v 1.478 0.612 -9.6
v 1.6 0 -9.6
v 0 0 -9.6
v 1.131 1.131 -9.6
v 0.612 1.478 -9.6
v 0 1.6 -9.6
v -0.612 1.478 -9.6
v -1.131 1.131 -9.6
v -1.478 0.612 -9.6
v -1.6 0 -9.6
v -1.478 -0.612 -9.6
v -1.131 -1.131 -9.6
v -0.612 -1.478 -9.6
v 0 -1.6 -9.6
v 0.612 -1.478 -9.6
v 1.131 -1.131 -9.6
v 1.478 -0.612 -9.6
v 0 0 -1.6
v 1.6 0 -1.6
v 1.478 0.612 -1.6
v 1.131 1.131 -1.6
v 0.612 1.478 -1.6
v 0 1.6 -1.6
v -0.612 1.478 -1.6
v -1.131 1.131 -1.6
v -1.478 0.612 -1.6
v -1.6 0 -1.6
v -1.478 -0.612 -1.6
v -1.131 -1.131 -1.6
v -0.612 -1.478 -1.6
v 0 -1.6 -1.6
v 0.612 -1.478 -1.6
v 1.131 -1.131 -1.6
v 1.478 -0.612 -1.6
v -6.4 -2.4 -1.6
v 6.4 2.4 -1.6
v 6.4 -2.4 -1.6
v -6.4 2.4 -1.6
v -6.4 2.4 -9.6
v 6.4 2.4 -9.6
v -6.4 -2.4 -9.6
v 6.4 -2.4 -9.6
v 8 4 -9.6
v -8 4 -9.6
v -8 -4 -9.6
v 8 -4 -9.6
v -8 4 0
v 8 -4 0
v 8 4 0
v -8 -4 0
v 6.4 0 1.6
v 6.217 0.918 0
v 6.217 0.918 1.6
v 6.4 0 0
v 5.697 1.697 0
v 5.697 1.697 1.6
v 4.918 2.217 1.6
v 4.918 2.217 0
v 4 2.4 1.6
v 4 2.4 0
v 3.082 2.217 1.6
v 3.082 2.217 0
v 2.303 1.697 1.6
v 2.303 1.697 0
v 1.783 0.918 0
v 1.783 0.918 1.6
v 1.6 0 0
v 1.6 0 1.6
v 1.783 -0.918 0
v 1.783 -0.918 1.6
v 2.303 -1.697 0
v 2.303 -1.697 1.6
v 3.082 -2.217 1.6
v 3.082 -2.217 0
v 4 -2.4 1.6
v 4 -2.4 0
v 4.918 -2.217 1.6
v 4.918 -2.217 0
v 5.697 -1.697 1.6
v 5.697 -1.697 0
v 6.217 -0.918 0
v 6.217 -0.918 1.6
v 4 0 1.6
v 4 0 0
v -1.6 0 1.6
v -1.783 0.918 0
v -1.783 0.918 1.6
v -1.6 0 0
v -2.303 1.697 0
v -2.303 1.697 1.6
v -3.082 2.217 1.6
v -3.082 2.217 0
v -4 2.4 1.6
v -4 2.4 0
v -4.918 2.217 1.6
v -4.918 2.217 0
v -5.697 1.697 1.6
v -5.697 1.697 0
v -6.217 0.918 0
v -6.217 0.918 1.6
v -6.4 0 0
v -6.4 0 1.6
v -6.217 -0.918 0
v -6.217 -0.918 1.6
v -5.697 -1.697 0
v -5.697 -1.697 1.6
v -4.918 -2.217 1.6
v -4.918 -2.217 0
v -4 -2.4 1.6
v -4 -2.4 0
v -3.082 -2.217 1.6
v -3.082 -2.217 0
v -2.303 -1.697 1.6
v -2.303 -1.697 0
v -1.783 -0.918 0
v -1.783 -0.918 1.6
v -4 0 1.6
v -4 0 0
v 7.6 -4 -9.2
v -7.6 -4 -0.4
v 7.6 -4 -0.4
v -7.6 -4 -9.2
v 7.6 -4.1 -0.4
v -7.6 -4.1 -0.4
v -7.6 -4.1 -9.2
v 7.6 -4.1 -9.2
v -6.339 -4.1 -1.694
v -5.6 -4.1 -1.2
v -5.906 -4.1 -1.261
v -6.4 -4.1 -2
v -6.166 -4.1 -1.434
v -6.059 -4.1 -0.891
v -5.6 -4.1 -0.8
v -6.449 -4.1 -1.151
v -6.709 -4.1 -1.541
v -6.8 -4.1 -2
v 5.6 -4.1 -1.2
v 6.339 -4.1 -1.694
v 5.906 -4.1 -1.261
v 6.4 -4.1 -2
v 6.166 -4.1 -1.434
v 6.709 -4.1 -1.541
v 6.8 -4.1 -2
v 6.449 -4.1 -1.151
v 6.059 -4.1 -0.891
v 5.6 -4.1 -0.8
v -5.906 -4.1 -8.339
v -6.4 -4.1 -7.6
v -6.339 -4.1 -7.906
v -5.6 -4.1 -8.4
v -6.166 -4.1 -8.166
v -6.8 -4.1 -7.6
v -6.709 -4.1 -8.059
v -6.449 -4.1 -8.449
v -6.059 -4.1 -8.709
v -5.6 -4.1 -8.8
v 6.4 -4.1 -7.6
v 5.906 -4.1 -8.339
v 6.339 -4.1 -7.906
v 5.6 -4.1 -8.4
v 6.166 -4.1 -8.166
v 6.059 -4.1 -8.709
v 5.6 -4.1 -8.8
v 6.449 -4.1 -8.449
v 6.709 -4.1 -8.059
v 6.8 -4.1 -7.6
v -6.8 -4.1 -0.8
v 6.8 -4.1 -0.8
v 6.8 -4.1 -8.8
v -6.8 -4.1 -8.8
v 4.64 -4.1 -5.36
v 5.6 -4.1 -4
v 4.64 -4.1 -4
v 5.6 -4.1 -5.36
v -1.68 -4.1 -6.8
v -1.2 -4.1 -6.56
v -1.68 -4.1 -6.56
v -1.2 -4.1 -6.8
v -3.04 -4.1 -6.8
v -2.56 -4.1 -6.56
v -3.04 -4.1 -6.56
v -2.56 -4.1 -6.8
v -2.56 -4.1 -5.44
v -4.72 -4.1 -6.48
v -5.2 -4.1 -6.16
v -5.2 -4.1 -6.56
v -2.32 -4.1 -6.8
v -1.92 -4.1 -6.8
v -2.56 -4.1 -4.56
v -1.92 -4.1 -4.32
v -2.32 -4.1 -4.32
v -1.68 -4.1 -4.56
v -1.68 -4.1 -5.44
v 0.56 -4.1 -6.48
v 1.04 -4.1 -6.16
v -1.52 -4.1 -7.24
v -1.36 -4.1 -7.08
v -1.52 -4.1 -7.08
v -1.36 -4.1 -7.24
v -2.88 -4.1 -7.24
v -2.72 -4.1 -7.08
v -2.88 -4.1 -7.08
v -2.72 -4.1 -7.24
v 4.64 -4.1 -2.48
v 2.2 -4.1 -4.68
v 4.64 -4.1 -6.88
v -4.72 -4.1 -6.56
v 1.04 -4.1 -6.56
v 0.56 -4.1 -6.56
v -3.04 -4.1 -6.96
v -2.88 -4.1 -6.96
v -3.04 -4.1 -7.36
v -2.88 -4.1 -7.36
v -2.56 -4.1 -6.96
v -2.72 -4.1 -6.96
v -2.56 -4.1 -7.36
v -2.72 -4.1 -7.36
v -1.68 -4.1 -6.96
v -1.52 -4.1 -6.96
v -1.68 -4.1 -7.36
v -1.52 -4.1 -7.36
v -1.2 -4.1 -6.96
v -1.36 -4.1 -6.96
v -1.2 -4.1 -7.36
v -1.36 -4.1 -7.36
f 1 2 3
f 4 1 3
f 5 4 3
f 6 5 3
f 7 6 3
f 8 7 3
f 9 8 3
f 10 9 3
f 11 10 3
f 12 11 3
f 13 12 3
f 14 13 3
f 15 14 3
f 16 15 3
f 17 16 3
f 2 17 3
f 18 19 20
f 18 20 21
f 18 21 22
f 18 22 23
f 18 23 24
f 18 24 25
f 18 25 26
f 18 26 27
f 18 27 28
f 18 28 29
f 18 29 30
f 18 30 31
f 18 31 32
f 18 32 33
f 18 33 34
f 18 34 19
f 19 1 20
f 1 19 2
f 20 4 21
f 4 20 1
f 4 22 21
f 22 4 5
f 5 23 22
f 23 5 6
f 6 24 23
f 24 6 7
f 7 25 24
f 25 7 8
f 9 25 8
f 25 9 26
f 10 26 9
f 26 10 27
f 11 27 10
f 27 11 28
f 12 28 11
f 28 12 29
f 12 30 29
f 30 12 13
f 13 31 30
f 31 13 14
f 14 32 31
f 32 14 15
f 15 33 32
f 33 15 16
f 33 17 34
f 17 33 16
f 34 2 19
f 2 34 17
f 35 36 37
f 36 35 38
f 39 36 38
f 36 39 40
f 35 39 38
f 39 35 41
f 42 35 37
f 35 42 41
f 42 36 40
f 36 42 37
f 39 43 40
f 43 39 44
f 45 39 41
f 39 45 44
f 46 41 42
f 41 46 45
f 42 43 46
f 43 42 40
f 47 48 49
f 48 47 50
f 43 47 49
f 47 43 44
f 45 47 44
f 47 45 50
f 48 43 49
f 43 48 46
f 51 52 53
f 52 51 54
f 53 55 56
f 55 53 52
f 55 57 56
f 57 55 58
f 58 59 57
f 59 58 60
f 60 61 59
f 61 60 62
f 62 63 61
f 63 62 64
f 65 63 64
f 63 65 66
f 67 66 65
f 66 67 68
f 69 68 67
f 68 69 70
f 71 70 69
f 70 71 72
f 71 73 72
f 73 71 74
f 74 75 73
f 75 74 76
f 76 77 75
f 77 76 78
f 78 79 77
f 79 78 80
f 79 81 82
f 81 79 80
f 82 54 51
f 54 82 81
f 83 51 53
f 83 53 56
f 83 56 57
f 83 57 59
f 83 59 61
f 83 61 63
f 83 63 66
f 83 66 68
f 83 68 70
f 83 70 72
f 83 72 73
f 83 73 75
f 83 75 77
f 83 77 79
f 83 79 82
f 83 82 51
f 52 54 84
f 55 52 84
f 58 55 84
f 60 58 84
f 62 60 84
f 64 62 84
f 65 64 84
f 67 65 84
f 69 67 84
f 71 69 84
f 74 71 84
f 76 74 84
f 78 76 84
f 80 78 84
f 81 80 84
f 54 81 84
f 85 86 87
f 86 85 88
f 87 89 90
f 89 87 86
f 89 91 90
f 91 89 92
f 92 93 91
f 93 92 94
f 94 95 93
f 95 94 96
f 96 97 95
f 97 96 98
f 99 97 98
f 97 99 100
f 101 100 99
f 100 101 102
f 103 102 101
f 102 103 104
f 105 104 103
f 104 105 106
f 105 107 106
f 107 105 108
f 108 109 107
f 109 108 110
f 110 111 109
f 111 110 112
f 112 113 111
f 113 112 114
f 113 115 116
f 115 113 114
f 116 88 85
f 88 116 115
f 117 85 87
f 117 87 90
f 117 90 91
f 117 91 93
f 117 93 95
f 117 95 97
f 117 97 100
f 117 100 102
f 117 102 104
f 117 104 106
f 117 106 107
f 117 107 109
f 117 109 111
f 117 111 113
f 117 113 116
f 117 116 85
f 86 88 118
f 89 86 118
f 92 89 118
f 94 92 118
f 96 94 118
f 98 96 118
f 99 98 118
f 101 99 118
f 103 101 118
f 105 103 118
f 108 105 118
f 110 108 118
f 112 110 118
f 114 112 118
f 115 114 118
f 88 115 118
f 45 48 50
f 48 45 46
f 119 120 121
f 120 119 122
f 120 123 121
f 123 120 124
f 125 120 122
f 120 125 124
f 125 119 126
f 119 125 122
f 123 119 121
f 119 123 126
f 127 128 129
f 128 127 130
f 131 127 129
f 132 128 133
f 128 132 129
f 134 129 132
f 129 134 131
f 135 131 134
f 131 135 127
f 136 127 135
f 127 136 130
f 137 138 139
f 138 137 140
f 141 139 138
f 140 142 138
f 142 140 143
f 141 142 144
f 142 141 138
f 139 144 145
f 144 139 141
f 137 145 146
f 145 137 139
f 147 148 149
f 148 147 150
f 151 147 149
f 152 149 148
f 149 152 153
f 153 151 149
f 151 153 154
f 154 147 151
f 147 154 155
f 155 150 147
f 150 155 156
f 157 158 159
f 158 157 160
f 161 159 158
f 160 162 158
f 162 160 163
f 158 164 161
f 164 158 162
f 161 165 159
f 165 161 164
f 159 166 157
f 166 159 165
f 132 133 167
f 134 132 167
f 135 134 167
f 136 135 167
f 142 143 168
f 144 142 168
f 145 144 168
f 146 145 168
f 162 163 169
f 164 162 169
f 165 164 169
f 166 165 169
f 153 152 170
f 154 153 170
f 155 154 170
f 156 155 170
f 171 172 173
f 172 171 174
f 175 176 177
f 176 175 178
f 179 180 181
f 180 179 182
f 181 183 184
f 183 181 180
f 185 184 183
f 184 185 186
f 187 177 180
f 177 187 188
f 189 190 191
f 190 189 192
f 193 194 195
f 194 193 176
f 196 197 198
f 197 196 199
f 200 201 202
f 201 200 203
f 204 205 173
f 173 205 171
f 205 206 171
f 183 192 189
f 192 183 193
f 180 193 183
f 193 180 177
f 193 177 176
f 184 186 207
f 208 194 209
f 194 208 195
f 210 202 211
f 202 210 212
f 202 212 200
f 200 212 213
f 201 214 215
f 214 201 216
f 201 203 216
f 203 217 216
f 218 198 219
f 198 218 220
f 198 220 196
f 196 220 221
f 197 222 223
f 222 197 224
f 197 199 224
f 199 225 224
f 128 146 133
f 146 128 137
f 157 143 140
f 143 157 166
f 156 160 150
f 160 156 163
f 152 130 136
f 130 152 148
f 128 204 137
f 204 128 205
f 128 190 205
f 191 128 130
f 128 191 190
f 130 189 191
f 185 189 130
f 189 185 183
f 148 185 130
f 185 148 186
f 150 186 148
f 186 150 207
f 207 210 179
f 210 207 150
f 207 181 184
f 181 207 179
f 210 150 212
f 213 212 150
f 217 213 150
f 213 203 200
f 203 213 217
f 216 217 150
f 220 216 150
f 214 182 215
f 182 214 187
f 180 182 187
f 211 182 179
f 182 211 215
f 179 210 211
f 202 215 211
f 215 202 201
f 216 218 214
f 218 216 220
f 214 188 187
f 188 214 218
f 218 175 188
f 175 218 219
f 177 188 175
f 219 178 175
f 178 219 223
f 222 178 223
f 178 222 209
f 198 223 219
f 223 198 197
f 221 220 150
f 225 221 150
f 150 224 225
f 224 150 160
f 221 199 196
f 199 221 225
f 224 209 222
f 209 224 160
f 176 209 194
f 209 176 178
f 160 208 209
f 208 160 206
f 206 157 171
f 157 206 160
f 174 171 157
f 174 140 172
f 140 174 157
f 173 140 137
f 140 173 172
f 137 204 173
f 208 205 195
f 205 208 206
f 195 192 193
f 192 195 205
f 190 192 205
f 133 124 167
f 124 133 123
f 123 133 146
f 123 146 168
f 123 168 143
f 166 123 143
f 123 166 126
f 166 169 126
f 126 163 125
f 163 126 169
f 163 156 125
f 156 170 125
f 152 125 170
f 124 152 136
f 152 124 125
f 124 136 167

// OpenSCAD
// file: ../p/4-4edge.scad
use <../lib.scad>
function ldraw_lib__4_4edge() = [
// 0 Circle 1.0
// 0 Name: 4-4edge.dat
// 0 Author: James Jessiman
// 0 !LDRAW_ORG Primitive UPDATE 2017-01
// 0 !LICENSE Licensed under CC BY 2.0 and CC BY 4.0 : see CAreadme.txt
// 
// 0 BFC CERTIFY CCW
  [0,"BFC","CERTIFY"],
  [0,"BFC","CCW"],
// 
// 0 !HISTORY 1998-12-15 [PTadmin] Official Update 1998-10
// 0 !HISTORY 2005-12-28 [PTadmin] Official Update 2005-01
// 0 !HISTORY 2007-06-24 [PTadmin] Header formatted for Contributor Agreement
// 0 !HISTORY 2008-07-01 [PTadmin] Official Update 2008-01
// 0 !HISTORY 2017-01-15 [Steffen] BFCed
// 0 !HISTORY 2017-12-30 [PTadmin] Official Update 2017-01
// 
// 
// 2 24 1 0 0 0.9239 0 0.3827
  [2,24,1,0,0,0.9239,0,0.3827],
// 2 24 0.9239 0 0.3827 0.7071 0 0.7071
  [2,24,0.9239,0,0.3827,0.7071,0,0.7071],
// 2 24 0.7071 0 0.7071 0.3827 0 0.9239
  [2,24,0.7071,0,0.7071,0.3827,0,0.9239],
// 2 24 0.3827 0 0.9239 0 0 1
  [2,24,0.3827,0,0.9239,0,0,1],
// 2 24 0 0 1 -0.3827 0 0.9239
  [2,24,0,0,1,-0.3827,0,0.9239],
// 2 24 -0.3827 0 0.9239 -0.7071 0 0.7071
  [2,24,-0.3827,0,0.9239,-0.7071,0,0.7071],
// 2 24 -0.7071 0 0.7071 -0.9239 0 0.3827
  [2,24,-0.7071,0,0.7071,-0.9239,0,0.3827],
// 2 24 -0.9239 0 0.3827 -1 0 -0
  [2,24,-0.9239,0,0.3827,-1,0,-0],
// 2 24 -1 0 -0 -0.9239 0 -0.3827
  [2,24,-1,0,-0,-0.9239,0,-0.3827],
// 2 24 -0.9239 0 -0.3827 -0.7071 0 -0.7071
  [2,24,-0.9239,0,-0.3827,-0.7071,0,-0.7071],
// 2 24 -0.7071 0 -0.7071 -0.3827 0 -0.9239
  [2,24,-0.7071,0,-0.7071,-0.3827,0,-0.9239],
// 2 24 -0.3827 0 -0.9239 0 0 -1
  [2,24,-0.3827,0,-0.9239,0,0,-1],
// 2 24 0 0 -1 0.3827 0 -0.9239
  [2,24,0,0,-1,0.3827,0,-0.9239],
// 2 24 0.3827 0 -0.9239 0.7071 0 -0.7071
  [2,24,0.3827,0,-0.9239,0.7071,0,-0.7071],
// 2 24 0.7071 0 -0.7071 0.9239 0 -0.3827
  [2,24,0.7071,0,-0.7071,0.9239,0,-0.3827],
// 2 24 0.9239 0 -0.3827 1 0 0
  [2,24,0.9239,0,-0.3827,1,0,0],
];
module ldraw_lib__4_4edge(step=0, col=false, unit=2/5, alt=false, line=0.2, solid=!$preview)
    makepoly(ldraw_lib__4_4edge(), step=step, col=col, unit=unit, alt=alt, line=line, solid=solid);
ldraw_lib__4_4edge(line=0.2);
// file: ../p/4-4disc.scad
use <../lib.scad>
function ldraw_lib__4_4disc() = [
// 0 Disc 1.0
// 0 Name: 4-4disc.dat
// 0 Author: James Jessiman
// 0 !LDRAW_ORG Primitive UPDATE 2002-02
// 0 !LICENSE Licensed under CC BY 2.0 and CC BY 4.0 : see CAreadme.txt
// 
// 0 BFC CERTIFY CCW
  [0,"BFC","CERTIFY"],
  [0,"BFC","CCW"],
// 
// 0 !HISTORY 1998-12-15 [PTadmin] Official Update 1998-10
// 0 !HISTORY 2002-03-23 [sbliss] Added BFC statement
// 0 !HISTORY 2002-04-25 [PTadmin] Official Update 2002-02
// 0 !HISTORY 2007-06-24 [PTadmin] Header formatted for Contributor Agreement
// 0 !HISTORY 2008-07-01 [PTadmin] Official Update 2008-01
// 
// 
// 3 16 0 0 0 1 0 0 0.9239 0 0.3827
  [3,16,0,0,0,1,0,0,0.9239,0,0.3827],
// 3 16 0 0 0 0.9239 0 0.3827 0.7071 0 0.7071
  [3,16,0,0,0,0.9239,0,0.3827,0.7071,0,0.7071],
// 3 16 0 0 0 0.7071 0 0.7071 0.3827 0 0.9239
  [3,16,0,0,0,0.7071,0,0.7071,0.3827,0,0.9239],
// 3 16 0 0 0 0.3827 0 0.9239 0 0 1
  [3,16,0,0,0,0.3827,0,0.9239,0,0,1],
// 3 16 0 0 0 0 0 1 -0.3827 0 0.9239
  [3,16,0,0,0,0,0,1,-0.3827,0,0.9239],
// 3 16 0 0 0 -0.3827 0 0.9239 -0.7071 0 0.7071
  [3,16,0,0,0,-0.3827,0,0.9239,-0.7071,0,0.7071],
// 3 16 0 0 0 -0.7071 0 0.7071 -0.9239 0 0.3827
  [3,16,0,0,0,-0.7071,0,0.7071,-0.9239,0,0.3827],
// 3 16 0 0 0 -0.9239 0 0.3827 -1 0 -0
  [3,16,0,0,0,-0.9239,0,0.3827,-1,0,-0],
// 3 16 0 0 0 -1 0 -0 -0.9239 0 -0.3827
  [3,16,0,0,0,-1,0,-0,-0.9239,0,-0.3827],
// 3 16 0 0 0 -0.9239 0 -0.3827 -0.7071 0 -0.7071
  [3,16,0,0,0,-0.9239,0,-0.3827,-0.7071,0,-0.7071],
// 3 16 0 0 0 -0.7071 0 -0.7071 -0.3827 0 -0.9239
  [3,16,0,0,0,-0.7071,0,-0.7071,-0.3827,0,-0.9239],
// 3 16 0 0 0 -0.3827 0 -0.9239 0 0 -1
  [3,16,0,0,0,-0.3827,0,-0.9239,0,0,-1],
// 3 16 0 0 0 0 0 -1 0.3827 0 -0.9239
  [3,16,0,0,0,0,0,-1,0.3827,0,-0.9239],
// 3 16 0 0 0 0.3827 0 -0.9239 0.7071 0 -0.7071
  [3,16,0,0,0,0.3827,0,-0.9239,0.7071,0,-0.7071],
// 3 16 0 0 0 0.7071 0 -0.7071 0.9239 0 -0.3827
  [3,16,0,0,0,0.7071,0,-0.7071,0.9239,0,-0.3827],
// 3 16 0 0 0 0.9239 0 -0.3827 1 0 0
  [3,16,0,0,0,0.9239,0,-0.3827,1,0,0],
// 0
];
module ldraw_lib__4_4disc(step=0, col=false, unit=2/5, alt=false, line=0.2, solid=!$preview)
    makepoly(ldraw_lib__4_4disc(), step=step, col=col, unit=unit, alt=alt, line=line, solid=solid);
ldraw_lib__4_4disc(line=0.2);
// file: ../p/4-4cyli.scad
use <../lib.scad>
$fa=1; $fs=0.2;
function ldraw_lib__4_4cyli(realsolid=false) = [
// 0 Cylinder 1.0
// 0 Name: 4-4cyli.dat
// 0 Author: James Jessiman
// 0 !LDRAW_ORG Primitive UPDATE 2005-01
// 0 !LICENSE Licensed under CC BY 2.0 and CC BY 4.0 : see CAreadme.txt
// 
// 0 BFC CERTIFY CCW
  [0,"BFC","CERTIFY"],
  [0,"BFC","CCW"],
// 
// 0 !HISTORY 1998-12-15 [PTadmin] Official Update 1998-10
// 0 !HISTORY 2002-03-23 [sbliss] Added BFC statement; merged headers from files in distributions LDraw 0.27 and Complete.
// 0 !HISTORY 2002-04-25 [PTadmin] Official Update 2002-02
// 0 !HISTORY 2004-12-14 [guyvivan] BFC CCW
// 0 !HISTORY 2005-12-28 [PTadmin] Official Update 2005-01
// 0 !HISTORY 2007-06-24 [PTadmin] Header formatted for Contributor Agreement
// 0 !HISTORY 2008-07-01 [PTadmin] Official Update 2008-01
// 
// 
// 4 16 1 1 0 0.9239 1 0.3827 0.9239 0 0.3827 1 0 0
  [4,16,1,1,0,0.9239,1,0.3827,0.9239,0,0.3827,1,0,0],
// 5 24 1 0 0 1 1 0 0.9239 0 0.3827 0.9239 0 -0.3827
  [5,24,1,0,0,1,1,0,0.9239,0,0.3827,0.9239,0,-0.3827],
// 4 16 0.9239 1 0.3827 0.7071 1 0.7071 0.7071 0 0.7071 0.9239 0 0.3827
  [4,16,0.9239,1,0.3827,0.7071,1,0.7071,0.7071,0,0.7071,0.9239,0,0.3827],
// 5 24 0.9239 0 0.3827 0.9239 1 0.3827 0.7071 0 0.7071 1 0 0
  [5,24,0.9239,0,0.3827,0.9239,1,0.3827,0.7071,0,0.7071,1,0,0],
// 4 16 0.7071 1 0.7071 0.3827 1 0.9239 0.3827 0 0.9239 0.7071 0 0.7071
  [4,16,0.7071,1,0.7071,0.3827,1,0.9239,0.3827,0,0.9239,0.7071,0,0.7071],
// 5 24 0.7071 0 0.7071 0.7071 1 0.7071 0.3827 0 0.9239 0.9239 0 0.3827
  [5,24,0.7071,0,0.7071,0.7071,1,0.7071,0.3827,0,0.9239,0.9239,0,0.3827],
// 4 16 0.3827 1 0.9239 0 1 1 0 0 1 0.3827 0 0.9239
  [4,16,0.3827,1,0.9239,0,1,1,0,0,1,0.3827,0,0.9239],
// 5 24 0.3827 0 0.9239 0.3827 1 0.9239 0 0 1 0.7071 0 0.7071
  [5,24,0.3827,0,0.9239,0.3827,1,0.9239,0,0,1,0.7071,0,0.7071],
// 4 16 0 1 1 -0.3827 1 0.9239 -0.3827 0 0.9239 0 0 1
  [4,16,0,1,1,-0.3827,1,0.9239,-0.3827,0,0.9239,0,0,1],
// 5 24 0 0 1 0 1 1 -0.3827 0 0.9239 0.3827 0 0.9239
  [5,24,0,0,1,0,1,1,-0.3827,0,0.9239,0.3827,0,0.9239],
// 4 16 -0.3827 1 0.9239 -0.7071 1 0.7071 -0.7071 0 0.7071 -0.3827 0 0.9239
  [4,16,-0.3827,1,0.9239,-0.7071,1,0.7071,-0.7071,0,0.7071,-0.3827,0,0.9239],
// 5 24 -0.3827 0 0.9239 -0.3827 1 0.9239 -0.7071 0 0.7071 0 0 1
  [5,24,-0.3827,0,0.9239,-0.3827,1,0.9239,-0.7071,0,0.7071,0,0,1],
// 4 16 -0.7071 1 0.7071 -0.9239 1 0.3827 -0.9239 0 0.3827 -0.7071 0 0.7071
  [4,16,-0.7071,1,0.7071,-0.9239,1,0.3827,-0.9239,0,0.3827,-0.7071,0,0.7071],
// 5 24 -0.7071 0 0.7071 -0.7071 1 0.7071 -0.9239 0 0.3827 -0.3827 0 0.9239
  [5,24,-0.7071,0,0.7071,-0.7071,1,0.7071,-0.9239,0,0.3827,-0.3827,0,0.9239],
// 4 16 -0.9239 1 0.3827 -1 1 0 -1 0 0 -0.9239 0 0.3827
  [4,16,-0.9239,1,0.3827,-1,1,0,-1,0,0,-0.9239,0,0.3827],
// 5 24 -0.9239 0 0.3827 -0.9239 1 0.3827 -1 0 0 -0.7071 0 0.7071
  [5,24,-0.9239,0,0.3827,-0.9239,1,0.3827,-1,0,0,-0.7071,0,0.7071],
// 4 16 -1 1 0 -0.9239 1 -0.3827 -0.9239 0 -0.3827 -1 0 0
  [4,16,-1,1,0,-0.9239,1,-0.3827,-0.9239,0,-0.3827,-1,0,0],
// 5 24 -1 0 0 -1 1 0 -0.9239 0 -0.3827 -0.9239 0 0.3827
  [5,24,-1,0,0,-1,1,0,-0.9239,0,-0.3827,-0.9239,0,0.3827],
// 4 16 -0.9239 1 -0.3827 -0.7071 1 -0.7071 -0.7071 0 -0.7071 -0.9239 0 -0.3827
  [4,16,-0.9239,1,-0.3827,-0.7071,1,-0.7071,-0.7071,0,-0.7071,-0.9239,0,-0.3827],
// 5 24 -0.9239 0 -0.3827 -0.9239 1 -0.3827 -0.7071 0 -0.7071 -1 0 0
  [5,24,-0.9239,0,-0.3827,-0.9239,1,-0.3827,-0.7071,0,-0.7071,-1,0,0],
// 4 16 -0.7071 1 -0.7071 -0.3827 1 -0.9239 -0.3827 0 -0.9239 -0.7071 0 -0.7071
  [4,16,-0.7071,1,-0.7071,-0.3827,1,-0.9239,-0.3827,0,-0.9239,-0.7071,0,-0.7071],
// 5 24 -0.7071 0 -0.7071 -0.7071 1 -0.7071 -0.3827 0 -0.9239 -0.9239 0 -0.3827
  [5,24,-0.7071,0,-0.7071,-0.7071,1,-0.7071,-0.3827,0,-0.9239,-0.9239,0,-0.3827],
// 4 16 -0.3827 1 -0.9239 0 1 -1 0 0 -1 -0.3827 0 -0.9239
  [4,16,-0.3827,1,-0.9239,0,1,-1,0,0,-1,-0.3827,0,-0.9239],
// 5 24 -0.3827 0 -0.9239 -0.3827 1 -0.9239 0 0 -1 -0.7071 0 -0.7071
  [5,24,-0.3827,0,-0.9239,-0.3827,1,-0.9239,0,0,-1,-0.7071,0,-0.7071],
// 4 16 0 1 -1 0.3827 1 -0.9239 0.3827 0 -0.9239 0 0 -1
  [4,16,0,1,-1,0.3827,1,-0.9239,0.3827,0,-0.9239,0,0,-1],
// 5 24 0 0 -1 0 1 -1 0.3827 0 -0.9239 -0.3827 0 -0.9239
  [5,24,0,0,-1,0,1,-1,0.3827,0,-0.9239,-0.3827,0,-0.9239],
// 4 16 0.3827 1 -0.9239 0.7071 1 -0.7071 0.7071 0 -0.7071 0.3827 0 -0.9239
  [4,16,0.3827,1,-0.9239,0.7071,1,-0.7071,0.7071,0,-0.7071,0.3827,0,-0.9239],
// 5 24 0.3827 0 -0.9239 0.3827 1 -0.9239 0.7071 0 -0.7071 0 0 -1
  [5,24,0.3827,0,-0.9239,0.3827,1,-0.9239,0.7071,0,-0.7071,0,0,-1],
// 4 16 0.7071 1 -0.7071 0.9239 1 -0.3827 0.9239 0 -0.3827 0.7071 0 -0.7071
  [4,16,0.7071,1,-0.7071,0.9239,1,-0.3827,0.9239,0,-0.3827,0.7071,0,-0.7071],
// 5 24 0.7071 0 -0.7071 0.7071 1 -0.7071 0.9239 0 -0.3827 0.3827 0 -0.9239
  [5,24,0.7071,0,-0.7071,0.7071,1,-0.7071,0.9239,0,-0.3827,0.3827,0,-0.9239],
// 4 16 0.9239 1 -0.3827 1 1 0 1 0 0 0.9239 0 -0.3827
  [4,16,0.9239,1,-0.3827,1,1,0,1,0,0,0.9239,0,-0.3827],
// 5 24 0.9239 0 -0.3827 0.9239 1 -0.3827 1 0 0 0.7071 0 -0.7071
  [5,24,0.9239,0,-0.3827,0.9239,1,-0.3827,1,0,0,0.7071,0,-0.7071],
// 0
];
module ldraw_lib__4_4cyli(step=0, col=false, unit=2/5, alt=false, line=0.2, solid=!$preview)
    makepoly(ldraw_lib__4_4cyli(solid), step=step, col=col, unit=unit, alt=alt, line=line, solid=solid);
ldraw_lib__4_4cyli(line=0.2);
// file: ../p/stud3.scad
use <../lib.scad>
use <4-4cyli.scad>
use <4-4disc.scad>
use <4-4edge.scad>
function ldraw_lib__stud3() = [
// 0 Stud Tube Solid
// 0 Name: stud3.dat
// 0 Author: James Jessiman
// 0 !LDRAW_ORG Primitive UPDATE 2012-01
// 0 !LICENSE Licensed under CC BY 4.0 : see CAreadme.txt
// 
// 0 BFC CERTIFY CCW
  [0,"BFC","CERTIFY"],
  [0,"BFC","CCW"],
// 
// 0 !HISTORY 2002-04-04 [sbliss] Modified for BFC compliance
// 0 !HISTORY 2002-04-25 [PTadmin] Official Update 2002-02
// 0 !HISTORY 2007-06-24 [PTadmin] Header formatted for Contributor Agreement
// 0 !HISTORY 2008-07-01 [PTadmin] Official Update 2008-01
// 0 !HISTORY 2012-02-16 [Philo] Changed to CCW
// 0 !HISTORY 2012-03-30 [PTadmin] Official Update 2012-01
// 
// 
// 1 16 0 -4 0 4 0 0 0 1 0 0 0 4 4-4edge.dat
  [1,16,0,-4,0,4,0,0,0,1,0,0,0,4, ldraw_lib__4_4edge()],
// 1 16 0 0 0 4 0 0 0 1 0 0 0 4 4-4edge.dat
  [1,16,0,0,0,4,0,0,0,1,0,0,0,4, ldraw_lib__4_4edge()],
// 1 16 0 -4 0 4 0 0 0 1 0 0 0 4 4-4disc.dat
  [1,16,0,-4,0,4,0,0,0,1,0,0,0,4, ldraw_lib__4_4disc()],
  [-1,16,0,0,0,4,0,0,0,-1,0,0,0,4, ldraw_lib__4_4disc()],
// 1 16 0 -4 0 4 0 0 0 4 0 0 0 4 4-4cyli.dat
  [1,16,0,-4,0,4,0,0,0,4,0,0,0,4, ldraw_lib__4_4cyli()],
];
module ldraw_lib__stud3(step=0, col=false, unit=2/5, alt=false, line=0.2, solid=!$preview)
    makepoly(ldraw_lib__stud3(), step=step, col=col, unit=unit, alt=alt, line=line, solid=solid);
ldraw_lib__stud3(line=0.2);
// file: ../p/stud.scad
use <../lib.scad>
use <4-4cyli.scad>
use <4-4disc.scad>
use <4-4edge.scad>
function ldraw_lib__stud() = [
// 0 Stud
// 0 Name: stud.dat
// 0 Author: James Jessiman
// 0 !LDRAW_ORG Primitive UPDATE 2012-01
// 0 !LICENSE Licensed under CC BY 4.0 : see CAreadme.txt
// 
// 0 BFC CERTIFY CCW
  [0,"BFC","CERTIFY"],
  [0,"BFC","CCW"],
// 
// 0 !HISTORY 2002-04-04 [sbliss] Modified for BFC compliance
// 0 !HISTORY 2002-04-25 [PTadmin] Official Update 2002-02
// 0 !HISTORY 2007-06-24 [PTadmin] Header formatted for Contributor Agreement
// 0 !HISTORY 2008-07-01 [PTadmin] Official Update 2008-01
// 0 !HISTORY 2012-02-16 [Philo] Changed to CCW
// 0 !HISTORY 2012-03-30 [PTadmin] Official Update 2012-01
// 
// 
// 1 16 0 0 0 6 0 0 0 1 0 0 0 6 4-4edge.dat
  [1,16,0,0,0,6,0,0,0,1,0,0,0,6, ldraw_lib__4_4edge()],
// 1 16 0 -4 0 6 0 0 0 1 0 0 0 6 4-4edge.dat
  [1,16,0,-4,0,6,0,0,0,1,0,0,0,6, ldraw_lib__4_4edge()],
// 1 16 0 0 0 6 0 0 0 -4 0 0 0 6 4-4cyli.dat
  [1,16,0,0,0,6,0,0,0,-4,0,0,0,6, ldraw_lib__4_4cyli()],
// 1 16 0 -4 0 6 0 0 0 1 0 0 0 6 4-4disc.dat
  [1,16,0,-4,0,6,0,0,0,1,0,0,0,6, ldraw_lib__4_4disc()],
  [-1,16,0,0,0,6,0,0,0,-1,0,0,0,6, ldraw_lib__4_4disc()],
];
module ldraw_lib__stud(step=0, col=false, unit=2/5, alt=false, line=0.2, solid=!$preview)
    makepoly(ldraw_lib__stud(), step=step, col=col, unit=unit, alt=alt, line=line, solid=solid);
ldraw_lib__stud(line=0.2);
// file: ../p/box5.scad
use <../lib.scad>
function ldraw_lib__box5() = [
// 0 Box with 5 Faces and All Edges
// 0 Name: box5.dat
// 0 Author: James Jessiman
// 0 !LDRAW_ORG Primitive UPDATE 2012-01
// 0 !LICENSE Licensed under CC BY 2.0 and CC BY 4.0 : see CAreadme.txt
// 
// 0 BFC CERTIFY CCW
  [0,"BFC","CERTIFY"],
  [0,"BFC","CCW"],
// 
// 0 !HISTORY 2002-04-03 [sbliss] Modified for BFC compliance
// 0 !HISTORY 2002-04-25 [PTadmin] Official Update 2002-02
// 0 !HISTORY 2007-06-24 [PTadmin] Header formatted for Contributor Agreement
// 0 !HISTORY 2008-07-01 [PTadmin] Official Update 2008-01
// 0 !HISTORY 2012-02-16 [Philo] Changed to CCW
// 0 !HISTORY 2012-03-30 [PTadmin] Official Update 2012-01
// 
// 
// 2 24 1 1 1 -1 1 1
  [2,24,1,1,1,-1,1,1],
// 2 24 -1 1 1 -1 1 -1
  [2,24,-1,1,1,-1,1,-1],
// 2 24 -1 1 -1 1 1 -1
  [2,24,-1,1,-1,1,1,-1],
// 2 24 1 1 -1 1 1 1
  [2,24,1,1,-1,1,1,1],
// 2 24 1 0 1 -1 0 1
  [2,24,1,0,1,-1,0,1],
// 2 24 -1 0 1 -1 0 -1
  [2,24,-1,0,1,-1,0,-1],
// 2 24 -1 0 -1 1 0 -1
  [2,24,-1,0,-1,1,0,-1],
// 2 24 1 0 -1 1 0 1
  [2,24,1,0,-1,1,0,1],
// 2 24 1 0 1 1 1 1
  [2,24,1,0,1,1,1,1],
// 2 24 -1 0 1 -1 1 1
  [2,24,-1,0,1,-1,1,1],
// 2 24 1 0 -1 1 1 -1
  [2,24,1,0,-1,1,1,-1],
// 2 24 -1 0 -1 -1 1 -1
  [2,24,-1,0,-1,-1,1,-1],
// 4 16 -1 1 1 1 1 1 1 1 -1 -1 1 -1
  [4,16,-1,1,1,1,1,1,1,1,-1,-1,1,-1],
// 4 16 -1 1 1 -1 0 1 1 0 1 1 1 1
  [4,16,-1,1,1,-1,0,1,1,0,1,1,1,1],
// 4 16 -1 1 -1 -1 0 -1 -1 0 1 -1 1 1
  [4,16,-1,1,-1,-1,0,-1,-1,0,1,-1,1,1],
// 4 16 1 1 -1 1 0 -1 -1 0 -1 -1 1 -1
  [4,16,1,1,-1,1,0,-1,-1,0,-1,-1,1,-1],
// 4 16 1 1 1 1 0 1 1 0 -1 1 1 -1
  [4,16,1,1,1,1,0,1,1,0,-1,1,1,-1],
];
makepoly(ldraw_lib__box5(), line=0.2);
// file: ../p/box4t.scad
use <../lib.scad>
function ldraw_lib__box4t() = [
// 0 Box with 4 Adjacent Faces and All Edges
// 0 Name: box4t.dat
// 0 Author: Tore Eriksson [Tore_Eriksson]
// 0 !LDRAW_ORG Primitive UPDATE 2003-02
// 0 !LICENSE Licensed under CC BY 2.0 and CC BY 4.0 : see CAreadme.txt
// 
// 0 BFC CERTIFY CCW
  [0,"BFC","CERTIFY"],
  [0,"BFC","CCW"],
// 
// 0 !HISTORY 1997-09-29 [PTadmin] Official Update 1997-15
// 0 !HISTORY 2002-08-31 [izanette] Modified with WINDZ for BFC compliance
// 0 !HISTORY 2003-08-01 [PTadmin] Official Update 2003-02
// 0 !HISTORY 2007-06-24 [PTadmin] Header formatted for Contributor Agreement
// 0 !HISTORY 2008-07-01 [PTadmin] Official Update 2008-01
// 
// 
// 2 24 1 1 1 -1 1 1
  [2,24,1,1,1,-1,1,1],
// 2 24 -1 1 1 -1 1 -1
  [2,24,-1,1,1,-1,1,-1],
// 2 24 -1 1 -1 1 1 -1
  [2,24,-1,1,-1,1,1,-1],
// 2 24 1 1 -1 1 1 1
  [2,24,1,1,-1,1,1,1],
// 2 24 1 0 1 -1 0 1
  [2,24,1,0,1,-1,0,1],
// 2 24 -1 0 1 -1 0 -1
  [2,24,-1,0,1,-1,0,-1],
// 2 24 -1 0 -1 1 0 -1
  [2,24,-1,0,-1,1,0,-1],
// 2 24 1 0 -1 1 0 1
  [2,24,1,0,-1,1,0,1],
// 2 24 1 0 1 1 1 1
  [2,24,1,0,1,1,1,1],
// 2 24 -1 0 1 -1 1 1
  [2,24,-1,0,1,-1,1,1],
// 2 24 1 0 -1 1 1 -1
  [2,24,1,0,-1,1,1,-1],
// 2 24 -1 0 -1 -1 1 -1
  [2,24,-1,0,-1,-1,1,-1],
// 4 16 1 1 1 1 1 -1 -1 1 -1 -1 1 1
  [4,16,1,1,1,1,1,-1,-1,1,-1,-1,1,1],
// 4 16 1 1 1 -1 1 1 -1 0 1 1 0 1
  [4,16,1,1,1,-1,1,1,-1,0,1,1,0,1],
// 4 16 -1 1 1 -1 1 -1 -1 0 -1 -1 0 1
  [4,16,-1,1,1,-1,1,-1,-1,0,-1,-1,0,1],
// 0 4 16 -1 1 -1 -1 0 -1 1 0 -1 1 1 -1
// 4 16 1 1 -1 1 1 1 1 0 1 1 0 -1
  [4,16,1,1,-1,1,1,1,1,0,1,1,0,-1],
// 0
];
makepoly(ldraw_lib__box4t(), line=0.2);
// file: s/3004s01.scad
use <../../lib.scad>
use <../../p/box4t.scad>
use <../../p/box5.scad>
use <../../p/stud.scad>
use <../../p/stud3.scad>
$fa=1; $fs=0.2;
function ldraw_lib__s__3004s01(realsolid=false) = [
// 0 ~Brick  1 x  2 without Front Face
// 0 Name: s\3004s01.dat
// 0 Author: James Jessiman
// 0 !LDRAW_ORG Subpart UPDATE 2003-03
// 0 !LICENSE Licensed under CC BY 2.0 and CC BY 4.0 : see CAreadme.txt
// 
// 0 BFC CERTIFY CCW
  [0,"BFC","CERTIFY"],
  [0,"BFC","CCW"],
// 
// 0 !HISTORY 2003-09-07 [jriley] Subfiling, BFC
// 0 !HISTORY 2003-12-19 [PTadmin] Official Update 2003-03
// 0 !HISTORY 2007-08-29 [PTadmin] Header formatted for Contributor Agreement
// 0 !HISTORY 2008-07-01 [PTadmin] Official Update 2008-01
// 
// 
// 1 16 0 4 0 1 0 0 0 -5 0 0 0 1 stud3.dat
  [1,16,0,4,0,1,0,0,0,-5,0,0,0,1, ldraw_lib__stud3(realsolid)],
// 0 BFC INVERTNEXT
  [0,"BFC","INVERTNEXT"],
// 1 16 0 24 0 16 0 0 0 -20 0 0 0 6 box5.dat
  [1,16,0,24,0,16,0,0,0,-20,0,0,0,6, ldraw_lib__box5(realsolid)],
// 4 16 20 24 10 16 24 6 -16 24 6 -20 24 10
  [4,16,20,24,10,16,24,6,-16,24,6,-20,24,10],
// 4 16 -20 24 10 -16 24 6 -16 24 -6 -20 24 -10
  [4,16,-20,24,10,-16,24,6,-16,24,-6,-20,24,-10],
// 4 16 -20 24 -10 -16 24 -6 16 24 -6 20 24 -10
  [4,16,-20,24,-10,-16,24,-6,16,24,-6,20,24,-10],
// 4 16 20 24 -10 16 24 -6 16 24 6 20 24 10
  [4,16,20,24,-10,16,24,-6,16,24,6,20,24,10],
// 1 16 0 24 0 20 0 0 0 -24 0 0 0 10 box4t.dat
  [1,16,0,24,0,20,0,0,0,-24,0,0,0,10, ldraw_lib__box4t(realsolid)],
// 1 16 10 0 0 1 0 0 0 1 0 0 0 1 stud.dat
  [1,16,10,0,0,1,0,0,0,1,0,0,0,1, ldraw_lib__stud(realsolid)],
// 1 16 -10 0 0 1 0 0 0 1 0 0 0 1 stud.dat
  [1,16,-10,0,0,1,0,0,0,1,0,0,0,1, ldraw_lib__stud(realsolid)],
// 0
];
module ldraw_lib__s__3004s01(step=0, col=false, unit=2/5, alt=false, line=0.2, solid=!$preview)
    makepoly(ldraw_lib__s__3004s01(solid), step=step, col=col, unit=unit, alt=alt, line=line, solid=solid);
ldraw_lib__s__3004s01(line=0.2);
// file: ../p/box5-12.scad
use <../lib.scad>
function ldraw_lib__box5_12() = [
// 0 Box with 5 Faces without Any Edges
// 0 Name: box5-12.dat
// 0 Author: Chris Dee [cwdee]
// 0 !LDRAW_ORG Primitive UPDATE 2009-02
// 0 !LICENSE Licensed under CC BY 2.0 and CC BY 4.0 : see CAreadme.txt
// 
// 0 BFC CERTIFY CCW
  [0,"BFC","CERTIFY"],
  [0,"BFC","CCW"],
// 
// 0 !HISTORY 2009-09-03 [PTadmin] Official Update 2009-02
// 
// 
// 4 16 1 1 1 1 1 -1 -1 1 -1 -1 1 1
  [4,16,1,1,1,1,1,-1,-1,1,-1,-1,1,1],
// 4 16 -1 0 1 1 0 1 1 1 1 -1 1 1
  [4,16,-1,0,1,1,0,1,1,1,1,-1,1,1],
// 4 16 -1 0 -1 -1 0 1 -1 1 1 -1 1 -1
  [4,16,-1,0,-1,-1,0,1,-1,1,1,-1,1,-1],
// 4 16 1 0 -1 -1 0 -1 -1 1 -1 1 1 -1
  [4,16,1,0,-1,-1,0,-1,-1,1,-1,1,1,-1],
// 4 16 1 0 1 1 0 -1 1 1 -1 1 1 1
  [4,16,1,0,1,1,0,-1,1,1,-1,1,1,1],
// 0
];
module ldraw_lib__box5_12(step=0, col=false, unit=2/5, alt=false, line=0.2, solid=!$preview)
    makepoly(ldraw_lib__box5_12(), step=step, col=col, unit=unit, alt=alt, line=line, solid=solid);
ldraw_lib__box5_12(line=0.2);
// file: ../p/1-4ring2.scad
use <../lib.scad>
$fa=1; $fs=0.2;
function ldraw_lib__1_4ring2(realsolid=false) = [
// 0 Ring  2 x 0.25
// 0 Name: 1-4ring2.dat
// 0 Author: Franklin W. Cain [fwcain]
// 0 !LDRAW_ORG Primitive UPDATE 2015-01
// 0 !LICENSE Licensed under CC BY 2.0 and CC BY 4.0 : see CAreadme.txt
// 
// 0 BFC CERTIFY CCW
  [0,"BFC","CERTIFY"],
  [0,"BFC","CCW"],
// 
// 0 !HISTORY 2001-12-31 [PTadmin] Official Update 2001-03
// 0 !HISTORY 2007-06-22 [PTadmin] Header formatted for Contributor Agreement
// 0 !HISTORY 2008-07-01 [PTadmin] Official Update 2008-01
// 0 !HISTORY 2012-02-16 [Philo] Changed to CCW
// 0 !HISTORY 2012-03-30 [PTadmin] Official Update 2012-01
// 0 !HISTORY 2014-12-25 [MMR1988] Fixed a rounding issue
// 0 !HISTORY 2015-10-11 [PTadmin] Official Update 2015-01
// 
// 
// 4 16 3 0 0 2.7717 0 1.1481 1.8478 0 0.7654 2 0 0
  [4,16,3,0,0,2.7717,0,1.1481,1.8478,0,0.7654,2,0,0],
// 4 16 2.7717 0 1.1481 2.1213 0 2.1213 1.4142 0 1.4142 1.8478 0 0.7654
  [4,16,2.7717,0,1.1481,2.1213,0,2.1213,1.4142,0,1.4142,1.8478,0,0.7654],
// 4 16 2.1213 0 2.1213 1.1481 0 2.7717 0.7654 0 1.8478 1.4142 0 1.4142
  [4,16,2.1213,0,2.1213,1.1481,0,2.7717,0.7654,0,1.8478,1.4142,0,1.4142],
// 4 16 1.1481 0 2.7717 0 0 3 0 0 2 0.7654 0 1.8478
  [4,16,1.1481,0,2.7717,0,0,3,0,0,2,0.7654,0,1.8478],
// 0 // Build by Primitive Generator 2
];
module ldraw_lib__1_4ring2(step=0, col=false, unit=2/5, alt=false, line=0.2, solid=!$preview)
    makepoly(ldraw_lib__1_4ring2(solid), step=step, col=col, unit=unit, alt=alt, line=line, solid=solid);
ldraw_lib__1_4ring2(line=0.2);
// file: ../p/1-4ndis.scad
use <../lib.scad>
function ldraw_lib__1_4ndis() = [
// 0 Disc Negative 0.25
// 0 Name: 1-4ndis.dat
// 0 Author: James Jessiman
// 0 !LDRAW_ORG Primitive UPDATE 2012-01
// 0 !LICENSE Licensed under CC BY 2.0 and CC BY 4.0 : see CAreadme.txt
// 
// 0 BFC CERTIFY CCW
  [0,"BFC","CERTIFY"],
  [0,"BFC","CCW"],
// 
// 0 !HISTORY 2002-03-23 [sbliss] Added BFC Statement
// 0 !HISTORY 2002-04-25 [PTadmin] Official Update 2002-02
// 0 !HISTORY 2007-06-22 [PTadmin] Header formatted for Contributor Agreement
// 0 !HISTORY 2008-07-01 [PTadmin] Official Update 2008-01
// 0 !HISTORY 2012-02-16 [Philo] Changed to CCW
// 0 !HISTORY 2012-03-30 [PTadmin] Official Update 2012-01
// 
// 
// 3 16 0.9239 0 0.3827 1 0 0 1 0 1
  [3,16,0.9239,0,0.3827,1,0,0,1,0,1],
// 3 16 0.7071 0 0.7071 0.9239 0 0.3827 1 0 1
  [3,16,0.7071,0,0.7071,0.9239,0,0.3827,1,0,1],
// 3 16 0.3827 0 0.9239 0.7071 0 0.7071 1 0 1
  [3,16,0.3827,0,0.9239,0.7071,0,0.7071,1,0,1],
// 3 16 0 0 1 0.3827 0 0.9239 1 0 1
  [3,16,0,0,1,0.3827,0,0.9239,1,0,1],
];
module ldraw_lib__1_4ndis(step=0, col=false, unit=2/5, alt=false, line=0.2, solid=!$preview)
    makepoly(ldraw_lib__1_4ndis(), step=step, col=col, unit=unit, alt=alt, line=line, solid=solid);
ldraw_lib__1_4ndis(line=0.2);
// file: ../p/1-4chrd.scad
use <../lib.scad>
$fa=1; $fs=0.2;
function ldraw_lib__1_4chrd(realsolid=false) = [
// 0 Chord 0.25
// 0 Name: 1-4chrd.dat
// 0 Author: Tony Hafner [hafhead]
// 0 !LDRAW_ORG Primitive UPDATE 2012-02
// 0 !LICENSE Licensed under CC BY 2.0 and CC BY 4.0 : see CAreadme.txt
// 
// 0 BFC CERTIFY CCW
  [0,"BFC","CERTIFY"],
  [0,"BFC","CCW"],
// 
// 0 !HISTORY 2004-04-22 [PTadmin] Official Update 2004-02
// 0 !HISTORY 2007-10-09 [PTadmin] Header formatted for Contributor Agreement
// 0 !HISTORY 2008-07-01 [PTadmin] Official Update 2008-01
// 0 !HISTORY 2012-08-02 [MMR1988] Re-creation with PrimGen2 and Rectifier
// 0 !HISTORY 2012-08-09 [PTadmin] Official Update 2012-02
// 
// 
// 4 16 0.9239 0 0.3827 0.3827 0 0.9239 0 0 1 1 0 0
  [4,16,0.9239,0,0.3827,0.3827,0,0.9239,0,0,1,1,0,0],
// 3 16 0.7071 0 0.7071 0.3827 0 0.9239 0.9239 0 0.3827
  [3,16,0.7071,0,0.7071,0.3827,0,0.9239,0.9239,0,0.3827],
];
module ldraw_lib__1_4chrd(step=0, col=false, unit=2/5, alt=false, line=0.2, solid=!$preview)
    makepoly(ldraw_lib__1_4chrd(solid), step=step, col=col, unit=unit, alt=alt, line=line, solid=solid);
ldraw_lib__1_4chrd(line=0.2);
// file: 3004.scad
use <../lib.scad>
use <s/3004s01.scad>
function ldraw_lib__3004() = [
// 0 Brick  1 x  2
// 0 Name: 3004.dat
// 0 Author: James Jessiman
// 0 !LDRAW_ORG Part UPDATE 2022-05
// 0 !LICENSE Licensed under CC BY 2.0 and CC BY 4.0 : see CAreadme.txt
// 
// 0 BFC CERTIFY CCW
  [0,"BFC","CERTIFY"],
  [0,"BFC","CCW"],
// 
// 0 !HISTORY 2001-10-26 [PTadmin] Official Update 2001-01
// 0 !HISTORY 2002-05-07 {unknown} BFC Certification
// 0 !HISTORY 2002-06-11 [PTadmin] Official Update 2002-03
// 0 !HISTORY 2007-05-07 [PTadmin] Header formatted for Contributor Agreement
// 0 !HISTORY 2008-07-01 [PTadmin] Official Update 2008-01
// 0 !HISTORY 2022-08-04 [MagFors] Using subfile
// 0 !HISTORY 2022-09-15 [PTadmin] Official Update 2022-05
// 
// 
// 1 16 0 0 0 1 0 0 0 1 0 0 0 1 s\3004s01.dat
  [1,16,0,0,0,1,0,0,0,1,0,0,0,1, ldraw_lib__s__3004s01()],
// 4 16 -20 24 -10 20 24 -10 20 0 -10 -20 0 -10
  [4,16,-20,24,-10,20,24,-10,20,0,-10,-20,0,-10],
];
module ldraw_lib__3004(step=0, col=false, unit=2/5, alt=false, line=0.2, solid=!$preview)
    makepoly(ldraw_lib__3004(), step=step, col=col, unit=unit, alt=alt, line=line, solid=solid);
ldraw_lib__3004(line=0.2);
// main file
use <../lib.scad>
use <163156c.scad>
use <3004.scad>
function ldraw_lib__3004d0v() = [
// 0 Brick  1 x  2 with Town Airport Direction Signs on Light Grey Background Left Sticker
// 0 Name: 3004d0v.dat
// 0 Author: Takeshi Takahashi [RainbowDolphin]
// 0 !LDRAW_ORG Shortcut UPDATE 2024-07
// 0 !LICENSE Licensed under CC BY 4.0 : see CAreadme.txt
// 
// 0 BFC CERTIFY CCW
  [0,"BFC","CERTIFY"],
  [0,"BFC","CCW"],
// 
// 0 !CATEGORY Sticker Shortcut
// 0 !KEYWORDS Airport, Bricklink 3004pb018R, International jetport, set 6396
// 
// 0 !HISTORY 2024-08-26 [OrionP] Official Update 2024-07
// 
// 1 16 0 0 0 1 0 0 0 1 0 0 0 1 3004.dat
  [1,16,0,0,0,1,0,0,0,1,0,0,0,1, ldraw_lib__3004()],
// 1 16 0 12 -10 1 0 0 0 0 -1 0 1 0 163156c.dat
  [1,16,0,12,-10,1,0,0,0,0,-1,0,1,0, ldraw_lib__163156c()],
];
module ldraw_lib__3004d0v(step=0, col=false, unit=2/5, alt=false, line=0.2, solid=!$preview)
    makepoly(ldraw_lib__3004d0v(), step=step, col=col, unit=unit, alt=alt, line=line, solid=solid);
ldraw_lib__3004d0v(line=0.2);
